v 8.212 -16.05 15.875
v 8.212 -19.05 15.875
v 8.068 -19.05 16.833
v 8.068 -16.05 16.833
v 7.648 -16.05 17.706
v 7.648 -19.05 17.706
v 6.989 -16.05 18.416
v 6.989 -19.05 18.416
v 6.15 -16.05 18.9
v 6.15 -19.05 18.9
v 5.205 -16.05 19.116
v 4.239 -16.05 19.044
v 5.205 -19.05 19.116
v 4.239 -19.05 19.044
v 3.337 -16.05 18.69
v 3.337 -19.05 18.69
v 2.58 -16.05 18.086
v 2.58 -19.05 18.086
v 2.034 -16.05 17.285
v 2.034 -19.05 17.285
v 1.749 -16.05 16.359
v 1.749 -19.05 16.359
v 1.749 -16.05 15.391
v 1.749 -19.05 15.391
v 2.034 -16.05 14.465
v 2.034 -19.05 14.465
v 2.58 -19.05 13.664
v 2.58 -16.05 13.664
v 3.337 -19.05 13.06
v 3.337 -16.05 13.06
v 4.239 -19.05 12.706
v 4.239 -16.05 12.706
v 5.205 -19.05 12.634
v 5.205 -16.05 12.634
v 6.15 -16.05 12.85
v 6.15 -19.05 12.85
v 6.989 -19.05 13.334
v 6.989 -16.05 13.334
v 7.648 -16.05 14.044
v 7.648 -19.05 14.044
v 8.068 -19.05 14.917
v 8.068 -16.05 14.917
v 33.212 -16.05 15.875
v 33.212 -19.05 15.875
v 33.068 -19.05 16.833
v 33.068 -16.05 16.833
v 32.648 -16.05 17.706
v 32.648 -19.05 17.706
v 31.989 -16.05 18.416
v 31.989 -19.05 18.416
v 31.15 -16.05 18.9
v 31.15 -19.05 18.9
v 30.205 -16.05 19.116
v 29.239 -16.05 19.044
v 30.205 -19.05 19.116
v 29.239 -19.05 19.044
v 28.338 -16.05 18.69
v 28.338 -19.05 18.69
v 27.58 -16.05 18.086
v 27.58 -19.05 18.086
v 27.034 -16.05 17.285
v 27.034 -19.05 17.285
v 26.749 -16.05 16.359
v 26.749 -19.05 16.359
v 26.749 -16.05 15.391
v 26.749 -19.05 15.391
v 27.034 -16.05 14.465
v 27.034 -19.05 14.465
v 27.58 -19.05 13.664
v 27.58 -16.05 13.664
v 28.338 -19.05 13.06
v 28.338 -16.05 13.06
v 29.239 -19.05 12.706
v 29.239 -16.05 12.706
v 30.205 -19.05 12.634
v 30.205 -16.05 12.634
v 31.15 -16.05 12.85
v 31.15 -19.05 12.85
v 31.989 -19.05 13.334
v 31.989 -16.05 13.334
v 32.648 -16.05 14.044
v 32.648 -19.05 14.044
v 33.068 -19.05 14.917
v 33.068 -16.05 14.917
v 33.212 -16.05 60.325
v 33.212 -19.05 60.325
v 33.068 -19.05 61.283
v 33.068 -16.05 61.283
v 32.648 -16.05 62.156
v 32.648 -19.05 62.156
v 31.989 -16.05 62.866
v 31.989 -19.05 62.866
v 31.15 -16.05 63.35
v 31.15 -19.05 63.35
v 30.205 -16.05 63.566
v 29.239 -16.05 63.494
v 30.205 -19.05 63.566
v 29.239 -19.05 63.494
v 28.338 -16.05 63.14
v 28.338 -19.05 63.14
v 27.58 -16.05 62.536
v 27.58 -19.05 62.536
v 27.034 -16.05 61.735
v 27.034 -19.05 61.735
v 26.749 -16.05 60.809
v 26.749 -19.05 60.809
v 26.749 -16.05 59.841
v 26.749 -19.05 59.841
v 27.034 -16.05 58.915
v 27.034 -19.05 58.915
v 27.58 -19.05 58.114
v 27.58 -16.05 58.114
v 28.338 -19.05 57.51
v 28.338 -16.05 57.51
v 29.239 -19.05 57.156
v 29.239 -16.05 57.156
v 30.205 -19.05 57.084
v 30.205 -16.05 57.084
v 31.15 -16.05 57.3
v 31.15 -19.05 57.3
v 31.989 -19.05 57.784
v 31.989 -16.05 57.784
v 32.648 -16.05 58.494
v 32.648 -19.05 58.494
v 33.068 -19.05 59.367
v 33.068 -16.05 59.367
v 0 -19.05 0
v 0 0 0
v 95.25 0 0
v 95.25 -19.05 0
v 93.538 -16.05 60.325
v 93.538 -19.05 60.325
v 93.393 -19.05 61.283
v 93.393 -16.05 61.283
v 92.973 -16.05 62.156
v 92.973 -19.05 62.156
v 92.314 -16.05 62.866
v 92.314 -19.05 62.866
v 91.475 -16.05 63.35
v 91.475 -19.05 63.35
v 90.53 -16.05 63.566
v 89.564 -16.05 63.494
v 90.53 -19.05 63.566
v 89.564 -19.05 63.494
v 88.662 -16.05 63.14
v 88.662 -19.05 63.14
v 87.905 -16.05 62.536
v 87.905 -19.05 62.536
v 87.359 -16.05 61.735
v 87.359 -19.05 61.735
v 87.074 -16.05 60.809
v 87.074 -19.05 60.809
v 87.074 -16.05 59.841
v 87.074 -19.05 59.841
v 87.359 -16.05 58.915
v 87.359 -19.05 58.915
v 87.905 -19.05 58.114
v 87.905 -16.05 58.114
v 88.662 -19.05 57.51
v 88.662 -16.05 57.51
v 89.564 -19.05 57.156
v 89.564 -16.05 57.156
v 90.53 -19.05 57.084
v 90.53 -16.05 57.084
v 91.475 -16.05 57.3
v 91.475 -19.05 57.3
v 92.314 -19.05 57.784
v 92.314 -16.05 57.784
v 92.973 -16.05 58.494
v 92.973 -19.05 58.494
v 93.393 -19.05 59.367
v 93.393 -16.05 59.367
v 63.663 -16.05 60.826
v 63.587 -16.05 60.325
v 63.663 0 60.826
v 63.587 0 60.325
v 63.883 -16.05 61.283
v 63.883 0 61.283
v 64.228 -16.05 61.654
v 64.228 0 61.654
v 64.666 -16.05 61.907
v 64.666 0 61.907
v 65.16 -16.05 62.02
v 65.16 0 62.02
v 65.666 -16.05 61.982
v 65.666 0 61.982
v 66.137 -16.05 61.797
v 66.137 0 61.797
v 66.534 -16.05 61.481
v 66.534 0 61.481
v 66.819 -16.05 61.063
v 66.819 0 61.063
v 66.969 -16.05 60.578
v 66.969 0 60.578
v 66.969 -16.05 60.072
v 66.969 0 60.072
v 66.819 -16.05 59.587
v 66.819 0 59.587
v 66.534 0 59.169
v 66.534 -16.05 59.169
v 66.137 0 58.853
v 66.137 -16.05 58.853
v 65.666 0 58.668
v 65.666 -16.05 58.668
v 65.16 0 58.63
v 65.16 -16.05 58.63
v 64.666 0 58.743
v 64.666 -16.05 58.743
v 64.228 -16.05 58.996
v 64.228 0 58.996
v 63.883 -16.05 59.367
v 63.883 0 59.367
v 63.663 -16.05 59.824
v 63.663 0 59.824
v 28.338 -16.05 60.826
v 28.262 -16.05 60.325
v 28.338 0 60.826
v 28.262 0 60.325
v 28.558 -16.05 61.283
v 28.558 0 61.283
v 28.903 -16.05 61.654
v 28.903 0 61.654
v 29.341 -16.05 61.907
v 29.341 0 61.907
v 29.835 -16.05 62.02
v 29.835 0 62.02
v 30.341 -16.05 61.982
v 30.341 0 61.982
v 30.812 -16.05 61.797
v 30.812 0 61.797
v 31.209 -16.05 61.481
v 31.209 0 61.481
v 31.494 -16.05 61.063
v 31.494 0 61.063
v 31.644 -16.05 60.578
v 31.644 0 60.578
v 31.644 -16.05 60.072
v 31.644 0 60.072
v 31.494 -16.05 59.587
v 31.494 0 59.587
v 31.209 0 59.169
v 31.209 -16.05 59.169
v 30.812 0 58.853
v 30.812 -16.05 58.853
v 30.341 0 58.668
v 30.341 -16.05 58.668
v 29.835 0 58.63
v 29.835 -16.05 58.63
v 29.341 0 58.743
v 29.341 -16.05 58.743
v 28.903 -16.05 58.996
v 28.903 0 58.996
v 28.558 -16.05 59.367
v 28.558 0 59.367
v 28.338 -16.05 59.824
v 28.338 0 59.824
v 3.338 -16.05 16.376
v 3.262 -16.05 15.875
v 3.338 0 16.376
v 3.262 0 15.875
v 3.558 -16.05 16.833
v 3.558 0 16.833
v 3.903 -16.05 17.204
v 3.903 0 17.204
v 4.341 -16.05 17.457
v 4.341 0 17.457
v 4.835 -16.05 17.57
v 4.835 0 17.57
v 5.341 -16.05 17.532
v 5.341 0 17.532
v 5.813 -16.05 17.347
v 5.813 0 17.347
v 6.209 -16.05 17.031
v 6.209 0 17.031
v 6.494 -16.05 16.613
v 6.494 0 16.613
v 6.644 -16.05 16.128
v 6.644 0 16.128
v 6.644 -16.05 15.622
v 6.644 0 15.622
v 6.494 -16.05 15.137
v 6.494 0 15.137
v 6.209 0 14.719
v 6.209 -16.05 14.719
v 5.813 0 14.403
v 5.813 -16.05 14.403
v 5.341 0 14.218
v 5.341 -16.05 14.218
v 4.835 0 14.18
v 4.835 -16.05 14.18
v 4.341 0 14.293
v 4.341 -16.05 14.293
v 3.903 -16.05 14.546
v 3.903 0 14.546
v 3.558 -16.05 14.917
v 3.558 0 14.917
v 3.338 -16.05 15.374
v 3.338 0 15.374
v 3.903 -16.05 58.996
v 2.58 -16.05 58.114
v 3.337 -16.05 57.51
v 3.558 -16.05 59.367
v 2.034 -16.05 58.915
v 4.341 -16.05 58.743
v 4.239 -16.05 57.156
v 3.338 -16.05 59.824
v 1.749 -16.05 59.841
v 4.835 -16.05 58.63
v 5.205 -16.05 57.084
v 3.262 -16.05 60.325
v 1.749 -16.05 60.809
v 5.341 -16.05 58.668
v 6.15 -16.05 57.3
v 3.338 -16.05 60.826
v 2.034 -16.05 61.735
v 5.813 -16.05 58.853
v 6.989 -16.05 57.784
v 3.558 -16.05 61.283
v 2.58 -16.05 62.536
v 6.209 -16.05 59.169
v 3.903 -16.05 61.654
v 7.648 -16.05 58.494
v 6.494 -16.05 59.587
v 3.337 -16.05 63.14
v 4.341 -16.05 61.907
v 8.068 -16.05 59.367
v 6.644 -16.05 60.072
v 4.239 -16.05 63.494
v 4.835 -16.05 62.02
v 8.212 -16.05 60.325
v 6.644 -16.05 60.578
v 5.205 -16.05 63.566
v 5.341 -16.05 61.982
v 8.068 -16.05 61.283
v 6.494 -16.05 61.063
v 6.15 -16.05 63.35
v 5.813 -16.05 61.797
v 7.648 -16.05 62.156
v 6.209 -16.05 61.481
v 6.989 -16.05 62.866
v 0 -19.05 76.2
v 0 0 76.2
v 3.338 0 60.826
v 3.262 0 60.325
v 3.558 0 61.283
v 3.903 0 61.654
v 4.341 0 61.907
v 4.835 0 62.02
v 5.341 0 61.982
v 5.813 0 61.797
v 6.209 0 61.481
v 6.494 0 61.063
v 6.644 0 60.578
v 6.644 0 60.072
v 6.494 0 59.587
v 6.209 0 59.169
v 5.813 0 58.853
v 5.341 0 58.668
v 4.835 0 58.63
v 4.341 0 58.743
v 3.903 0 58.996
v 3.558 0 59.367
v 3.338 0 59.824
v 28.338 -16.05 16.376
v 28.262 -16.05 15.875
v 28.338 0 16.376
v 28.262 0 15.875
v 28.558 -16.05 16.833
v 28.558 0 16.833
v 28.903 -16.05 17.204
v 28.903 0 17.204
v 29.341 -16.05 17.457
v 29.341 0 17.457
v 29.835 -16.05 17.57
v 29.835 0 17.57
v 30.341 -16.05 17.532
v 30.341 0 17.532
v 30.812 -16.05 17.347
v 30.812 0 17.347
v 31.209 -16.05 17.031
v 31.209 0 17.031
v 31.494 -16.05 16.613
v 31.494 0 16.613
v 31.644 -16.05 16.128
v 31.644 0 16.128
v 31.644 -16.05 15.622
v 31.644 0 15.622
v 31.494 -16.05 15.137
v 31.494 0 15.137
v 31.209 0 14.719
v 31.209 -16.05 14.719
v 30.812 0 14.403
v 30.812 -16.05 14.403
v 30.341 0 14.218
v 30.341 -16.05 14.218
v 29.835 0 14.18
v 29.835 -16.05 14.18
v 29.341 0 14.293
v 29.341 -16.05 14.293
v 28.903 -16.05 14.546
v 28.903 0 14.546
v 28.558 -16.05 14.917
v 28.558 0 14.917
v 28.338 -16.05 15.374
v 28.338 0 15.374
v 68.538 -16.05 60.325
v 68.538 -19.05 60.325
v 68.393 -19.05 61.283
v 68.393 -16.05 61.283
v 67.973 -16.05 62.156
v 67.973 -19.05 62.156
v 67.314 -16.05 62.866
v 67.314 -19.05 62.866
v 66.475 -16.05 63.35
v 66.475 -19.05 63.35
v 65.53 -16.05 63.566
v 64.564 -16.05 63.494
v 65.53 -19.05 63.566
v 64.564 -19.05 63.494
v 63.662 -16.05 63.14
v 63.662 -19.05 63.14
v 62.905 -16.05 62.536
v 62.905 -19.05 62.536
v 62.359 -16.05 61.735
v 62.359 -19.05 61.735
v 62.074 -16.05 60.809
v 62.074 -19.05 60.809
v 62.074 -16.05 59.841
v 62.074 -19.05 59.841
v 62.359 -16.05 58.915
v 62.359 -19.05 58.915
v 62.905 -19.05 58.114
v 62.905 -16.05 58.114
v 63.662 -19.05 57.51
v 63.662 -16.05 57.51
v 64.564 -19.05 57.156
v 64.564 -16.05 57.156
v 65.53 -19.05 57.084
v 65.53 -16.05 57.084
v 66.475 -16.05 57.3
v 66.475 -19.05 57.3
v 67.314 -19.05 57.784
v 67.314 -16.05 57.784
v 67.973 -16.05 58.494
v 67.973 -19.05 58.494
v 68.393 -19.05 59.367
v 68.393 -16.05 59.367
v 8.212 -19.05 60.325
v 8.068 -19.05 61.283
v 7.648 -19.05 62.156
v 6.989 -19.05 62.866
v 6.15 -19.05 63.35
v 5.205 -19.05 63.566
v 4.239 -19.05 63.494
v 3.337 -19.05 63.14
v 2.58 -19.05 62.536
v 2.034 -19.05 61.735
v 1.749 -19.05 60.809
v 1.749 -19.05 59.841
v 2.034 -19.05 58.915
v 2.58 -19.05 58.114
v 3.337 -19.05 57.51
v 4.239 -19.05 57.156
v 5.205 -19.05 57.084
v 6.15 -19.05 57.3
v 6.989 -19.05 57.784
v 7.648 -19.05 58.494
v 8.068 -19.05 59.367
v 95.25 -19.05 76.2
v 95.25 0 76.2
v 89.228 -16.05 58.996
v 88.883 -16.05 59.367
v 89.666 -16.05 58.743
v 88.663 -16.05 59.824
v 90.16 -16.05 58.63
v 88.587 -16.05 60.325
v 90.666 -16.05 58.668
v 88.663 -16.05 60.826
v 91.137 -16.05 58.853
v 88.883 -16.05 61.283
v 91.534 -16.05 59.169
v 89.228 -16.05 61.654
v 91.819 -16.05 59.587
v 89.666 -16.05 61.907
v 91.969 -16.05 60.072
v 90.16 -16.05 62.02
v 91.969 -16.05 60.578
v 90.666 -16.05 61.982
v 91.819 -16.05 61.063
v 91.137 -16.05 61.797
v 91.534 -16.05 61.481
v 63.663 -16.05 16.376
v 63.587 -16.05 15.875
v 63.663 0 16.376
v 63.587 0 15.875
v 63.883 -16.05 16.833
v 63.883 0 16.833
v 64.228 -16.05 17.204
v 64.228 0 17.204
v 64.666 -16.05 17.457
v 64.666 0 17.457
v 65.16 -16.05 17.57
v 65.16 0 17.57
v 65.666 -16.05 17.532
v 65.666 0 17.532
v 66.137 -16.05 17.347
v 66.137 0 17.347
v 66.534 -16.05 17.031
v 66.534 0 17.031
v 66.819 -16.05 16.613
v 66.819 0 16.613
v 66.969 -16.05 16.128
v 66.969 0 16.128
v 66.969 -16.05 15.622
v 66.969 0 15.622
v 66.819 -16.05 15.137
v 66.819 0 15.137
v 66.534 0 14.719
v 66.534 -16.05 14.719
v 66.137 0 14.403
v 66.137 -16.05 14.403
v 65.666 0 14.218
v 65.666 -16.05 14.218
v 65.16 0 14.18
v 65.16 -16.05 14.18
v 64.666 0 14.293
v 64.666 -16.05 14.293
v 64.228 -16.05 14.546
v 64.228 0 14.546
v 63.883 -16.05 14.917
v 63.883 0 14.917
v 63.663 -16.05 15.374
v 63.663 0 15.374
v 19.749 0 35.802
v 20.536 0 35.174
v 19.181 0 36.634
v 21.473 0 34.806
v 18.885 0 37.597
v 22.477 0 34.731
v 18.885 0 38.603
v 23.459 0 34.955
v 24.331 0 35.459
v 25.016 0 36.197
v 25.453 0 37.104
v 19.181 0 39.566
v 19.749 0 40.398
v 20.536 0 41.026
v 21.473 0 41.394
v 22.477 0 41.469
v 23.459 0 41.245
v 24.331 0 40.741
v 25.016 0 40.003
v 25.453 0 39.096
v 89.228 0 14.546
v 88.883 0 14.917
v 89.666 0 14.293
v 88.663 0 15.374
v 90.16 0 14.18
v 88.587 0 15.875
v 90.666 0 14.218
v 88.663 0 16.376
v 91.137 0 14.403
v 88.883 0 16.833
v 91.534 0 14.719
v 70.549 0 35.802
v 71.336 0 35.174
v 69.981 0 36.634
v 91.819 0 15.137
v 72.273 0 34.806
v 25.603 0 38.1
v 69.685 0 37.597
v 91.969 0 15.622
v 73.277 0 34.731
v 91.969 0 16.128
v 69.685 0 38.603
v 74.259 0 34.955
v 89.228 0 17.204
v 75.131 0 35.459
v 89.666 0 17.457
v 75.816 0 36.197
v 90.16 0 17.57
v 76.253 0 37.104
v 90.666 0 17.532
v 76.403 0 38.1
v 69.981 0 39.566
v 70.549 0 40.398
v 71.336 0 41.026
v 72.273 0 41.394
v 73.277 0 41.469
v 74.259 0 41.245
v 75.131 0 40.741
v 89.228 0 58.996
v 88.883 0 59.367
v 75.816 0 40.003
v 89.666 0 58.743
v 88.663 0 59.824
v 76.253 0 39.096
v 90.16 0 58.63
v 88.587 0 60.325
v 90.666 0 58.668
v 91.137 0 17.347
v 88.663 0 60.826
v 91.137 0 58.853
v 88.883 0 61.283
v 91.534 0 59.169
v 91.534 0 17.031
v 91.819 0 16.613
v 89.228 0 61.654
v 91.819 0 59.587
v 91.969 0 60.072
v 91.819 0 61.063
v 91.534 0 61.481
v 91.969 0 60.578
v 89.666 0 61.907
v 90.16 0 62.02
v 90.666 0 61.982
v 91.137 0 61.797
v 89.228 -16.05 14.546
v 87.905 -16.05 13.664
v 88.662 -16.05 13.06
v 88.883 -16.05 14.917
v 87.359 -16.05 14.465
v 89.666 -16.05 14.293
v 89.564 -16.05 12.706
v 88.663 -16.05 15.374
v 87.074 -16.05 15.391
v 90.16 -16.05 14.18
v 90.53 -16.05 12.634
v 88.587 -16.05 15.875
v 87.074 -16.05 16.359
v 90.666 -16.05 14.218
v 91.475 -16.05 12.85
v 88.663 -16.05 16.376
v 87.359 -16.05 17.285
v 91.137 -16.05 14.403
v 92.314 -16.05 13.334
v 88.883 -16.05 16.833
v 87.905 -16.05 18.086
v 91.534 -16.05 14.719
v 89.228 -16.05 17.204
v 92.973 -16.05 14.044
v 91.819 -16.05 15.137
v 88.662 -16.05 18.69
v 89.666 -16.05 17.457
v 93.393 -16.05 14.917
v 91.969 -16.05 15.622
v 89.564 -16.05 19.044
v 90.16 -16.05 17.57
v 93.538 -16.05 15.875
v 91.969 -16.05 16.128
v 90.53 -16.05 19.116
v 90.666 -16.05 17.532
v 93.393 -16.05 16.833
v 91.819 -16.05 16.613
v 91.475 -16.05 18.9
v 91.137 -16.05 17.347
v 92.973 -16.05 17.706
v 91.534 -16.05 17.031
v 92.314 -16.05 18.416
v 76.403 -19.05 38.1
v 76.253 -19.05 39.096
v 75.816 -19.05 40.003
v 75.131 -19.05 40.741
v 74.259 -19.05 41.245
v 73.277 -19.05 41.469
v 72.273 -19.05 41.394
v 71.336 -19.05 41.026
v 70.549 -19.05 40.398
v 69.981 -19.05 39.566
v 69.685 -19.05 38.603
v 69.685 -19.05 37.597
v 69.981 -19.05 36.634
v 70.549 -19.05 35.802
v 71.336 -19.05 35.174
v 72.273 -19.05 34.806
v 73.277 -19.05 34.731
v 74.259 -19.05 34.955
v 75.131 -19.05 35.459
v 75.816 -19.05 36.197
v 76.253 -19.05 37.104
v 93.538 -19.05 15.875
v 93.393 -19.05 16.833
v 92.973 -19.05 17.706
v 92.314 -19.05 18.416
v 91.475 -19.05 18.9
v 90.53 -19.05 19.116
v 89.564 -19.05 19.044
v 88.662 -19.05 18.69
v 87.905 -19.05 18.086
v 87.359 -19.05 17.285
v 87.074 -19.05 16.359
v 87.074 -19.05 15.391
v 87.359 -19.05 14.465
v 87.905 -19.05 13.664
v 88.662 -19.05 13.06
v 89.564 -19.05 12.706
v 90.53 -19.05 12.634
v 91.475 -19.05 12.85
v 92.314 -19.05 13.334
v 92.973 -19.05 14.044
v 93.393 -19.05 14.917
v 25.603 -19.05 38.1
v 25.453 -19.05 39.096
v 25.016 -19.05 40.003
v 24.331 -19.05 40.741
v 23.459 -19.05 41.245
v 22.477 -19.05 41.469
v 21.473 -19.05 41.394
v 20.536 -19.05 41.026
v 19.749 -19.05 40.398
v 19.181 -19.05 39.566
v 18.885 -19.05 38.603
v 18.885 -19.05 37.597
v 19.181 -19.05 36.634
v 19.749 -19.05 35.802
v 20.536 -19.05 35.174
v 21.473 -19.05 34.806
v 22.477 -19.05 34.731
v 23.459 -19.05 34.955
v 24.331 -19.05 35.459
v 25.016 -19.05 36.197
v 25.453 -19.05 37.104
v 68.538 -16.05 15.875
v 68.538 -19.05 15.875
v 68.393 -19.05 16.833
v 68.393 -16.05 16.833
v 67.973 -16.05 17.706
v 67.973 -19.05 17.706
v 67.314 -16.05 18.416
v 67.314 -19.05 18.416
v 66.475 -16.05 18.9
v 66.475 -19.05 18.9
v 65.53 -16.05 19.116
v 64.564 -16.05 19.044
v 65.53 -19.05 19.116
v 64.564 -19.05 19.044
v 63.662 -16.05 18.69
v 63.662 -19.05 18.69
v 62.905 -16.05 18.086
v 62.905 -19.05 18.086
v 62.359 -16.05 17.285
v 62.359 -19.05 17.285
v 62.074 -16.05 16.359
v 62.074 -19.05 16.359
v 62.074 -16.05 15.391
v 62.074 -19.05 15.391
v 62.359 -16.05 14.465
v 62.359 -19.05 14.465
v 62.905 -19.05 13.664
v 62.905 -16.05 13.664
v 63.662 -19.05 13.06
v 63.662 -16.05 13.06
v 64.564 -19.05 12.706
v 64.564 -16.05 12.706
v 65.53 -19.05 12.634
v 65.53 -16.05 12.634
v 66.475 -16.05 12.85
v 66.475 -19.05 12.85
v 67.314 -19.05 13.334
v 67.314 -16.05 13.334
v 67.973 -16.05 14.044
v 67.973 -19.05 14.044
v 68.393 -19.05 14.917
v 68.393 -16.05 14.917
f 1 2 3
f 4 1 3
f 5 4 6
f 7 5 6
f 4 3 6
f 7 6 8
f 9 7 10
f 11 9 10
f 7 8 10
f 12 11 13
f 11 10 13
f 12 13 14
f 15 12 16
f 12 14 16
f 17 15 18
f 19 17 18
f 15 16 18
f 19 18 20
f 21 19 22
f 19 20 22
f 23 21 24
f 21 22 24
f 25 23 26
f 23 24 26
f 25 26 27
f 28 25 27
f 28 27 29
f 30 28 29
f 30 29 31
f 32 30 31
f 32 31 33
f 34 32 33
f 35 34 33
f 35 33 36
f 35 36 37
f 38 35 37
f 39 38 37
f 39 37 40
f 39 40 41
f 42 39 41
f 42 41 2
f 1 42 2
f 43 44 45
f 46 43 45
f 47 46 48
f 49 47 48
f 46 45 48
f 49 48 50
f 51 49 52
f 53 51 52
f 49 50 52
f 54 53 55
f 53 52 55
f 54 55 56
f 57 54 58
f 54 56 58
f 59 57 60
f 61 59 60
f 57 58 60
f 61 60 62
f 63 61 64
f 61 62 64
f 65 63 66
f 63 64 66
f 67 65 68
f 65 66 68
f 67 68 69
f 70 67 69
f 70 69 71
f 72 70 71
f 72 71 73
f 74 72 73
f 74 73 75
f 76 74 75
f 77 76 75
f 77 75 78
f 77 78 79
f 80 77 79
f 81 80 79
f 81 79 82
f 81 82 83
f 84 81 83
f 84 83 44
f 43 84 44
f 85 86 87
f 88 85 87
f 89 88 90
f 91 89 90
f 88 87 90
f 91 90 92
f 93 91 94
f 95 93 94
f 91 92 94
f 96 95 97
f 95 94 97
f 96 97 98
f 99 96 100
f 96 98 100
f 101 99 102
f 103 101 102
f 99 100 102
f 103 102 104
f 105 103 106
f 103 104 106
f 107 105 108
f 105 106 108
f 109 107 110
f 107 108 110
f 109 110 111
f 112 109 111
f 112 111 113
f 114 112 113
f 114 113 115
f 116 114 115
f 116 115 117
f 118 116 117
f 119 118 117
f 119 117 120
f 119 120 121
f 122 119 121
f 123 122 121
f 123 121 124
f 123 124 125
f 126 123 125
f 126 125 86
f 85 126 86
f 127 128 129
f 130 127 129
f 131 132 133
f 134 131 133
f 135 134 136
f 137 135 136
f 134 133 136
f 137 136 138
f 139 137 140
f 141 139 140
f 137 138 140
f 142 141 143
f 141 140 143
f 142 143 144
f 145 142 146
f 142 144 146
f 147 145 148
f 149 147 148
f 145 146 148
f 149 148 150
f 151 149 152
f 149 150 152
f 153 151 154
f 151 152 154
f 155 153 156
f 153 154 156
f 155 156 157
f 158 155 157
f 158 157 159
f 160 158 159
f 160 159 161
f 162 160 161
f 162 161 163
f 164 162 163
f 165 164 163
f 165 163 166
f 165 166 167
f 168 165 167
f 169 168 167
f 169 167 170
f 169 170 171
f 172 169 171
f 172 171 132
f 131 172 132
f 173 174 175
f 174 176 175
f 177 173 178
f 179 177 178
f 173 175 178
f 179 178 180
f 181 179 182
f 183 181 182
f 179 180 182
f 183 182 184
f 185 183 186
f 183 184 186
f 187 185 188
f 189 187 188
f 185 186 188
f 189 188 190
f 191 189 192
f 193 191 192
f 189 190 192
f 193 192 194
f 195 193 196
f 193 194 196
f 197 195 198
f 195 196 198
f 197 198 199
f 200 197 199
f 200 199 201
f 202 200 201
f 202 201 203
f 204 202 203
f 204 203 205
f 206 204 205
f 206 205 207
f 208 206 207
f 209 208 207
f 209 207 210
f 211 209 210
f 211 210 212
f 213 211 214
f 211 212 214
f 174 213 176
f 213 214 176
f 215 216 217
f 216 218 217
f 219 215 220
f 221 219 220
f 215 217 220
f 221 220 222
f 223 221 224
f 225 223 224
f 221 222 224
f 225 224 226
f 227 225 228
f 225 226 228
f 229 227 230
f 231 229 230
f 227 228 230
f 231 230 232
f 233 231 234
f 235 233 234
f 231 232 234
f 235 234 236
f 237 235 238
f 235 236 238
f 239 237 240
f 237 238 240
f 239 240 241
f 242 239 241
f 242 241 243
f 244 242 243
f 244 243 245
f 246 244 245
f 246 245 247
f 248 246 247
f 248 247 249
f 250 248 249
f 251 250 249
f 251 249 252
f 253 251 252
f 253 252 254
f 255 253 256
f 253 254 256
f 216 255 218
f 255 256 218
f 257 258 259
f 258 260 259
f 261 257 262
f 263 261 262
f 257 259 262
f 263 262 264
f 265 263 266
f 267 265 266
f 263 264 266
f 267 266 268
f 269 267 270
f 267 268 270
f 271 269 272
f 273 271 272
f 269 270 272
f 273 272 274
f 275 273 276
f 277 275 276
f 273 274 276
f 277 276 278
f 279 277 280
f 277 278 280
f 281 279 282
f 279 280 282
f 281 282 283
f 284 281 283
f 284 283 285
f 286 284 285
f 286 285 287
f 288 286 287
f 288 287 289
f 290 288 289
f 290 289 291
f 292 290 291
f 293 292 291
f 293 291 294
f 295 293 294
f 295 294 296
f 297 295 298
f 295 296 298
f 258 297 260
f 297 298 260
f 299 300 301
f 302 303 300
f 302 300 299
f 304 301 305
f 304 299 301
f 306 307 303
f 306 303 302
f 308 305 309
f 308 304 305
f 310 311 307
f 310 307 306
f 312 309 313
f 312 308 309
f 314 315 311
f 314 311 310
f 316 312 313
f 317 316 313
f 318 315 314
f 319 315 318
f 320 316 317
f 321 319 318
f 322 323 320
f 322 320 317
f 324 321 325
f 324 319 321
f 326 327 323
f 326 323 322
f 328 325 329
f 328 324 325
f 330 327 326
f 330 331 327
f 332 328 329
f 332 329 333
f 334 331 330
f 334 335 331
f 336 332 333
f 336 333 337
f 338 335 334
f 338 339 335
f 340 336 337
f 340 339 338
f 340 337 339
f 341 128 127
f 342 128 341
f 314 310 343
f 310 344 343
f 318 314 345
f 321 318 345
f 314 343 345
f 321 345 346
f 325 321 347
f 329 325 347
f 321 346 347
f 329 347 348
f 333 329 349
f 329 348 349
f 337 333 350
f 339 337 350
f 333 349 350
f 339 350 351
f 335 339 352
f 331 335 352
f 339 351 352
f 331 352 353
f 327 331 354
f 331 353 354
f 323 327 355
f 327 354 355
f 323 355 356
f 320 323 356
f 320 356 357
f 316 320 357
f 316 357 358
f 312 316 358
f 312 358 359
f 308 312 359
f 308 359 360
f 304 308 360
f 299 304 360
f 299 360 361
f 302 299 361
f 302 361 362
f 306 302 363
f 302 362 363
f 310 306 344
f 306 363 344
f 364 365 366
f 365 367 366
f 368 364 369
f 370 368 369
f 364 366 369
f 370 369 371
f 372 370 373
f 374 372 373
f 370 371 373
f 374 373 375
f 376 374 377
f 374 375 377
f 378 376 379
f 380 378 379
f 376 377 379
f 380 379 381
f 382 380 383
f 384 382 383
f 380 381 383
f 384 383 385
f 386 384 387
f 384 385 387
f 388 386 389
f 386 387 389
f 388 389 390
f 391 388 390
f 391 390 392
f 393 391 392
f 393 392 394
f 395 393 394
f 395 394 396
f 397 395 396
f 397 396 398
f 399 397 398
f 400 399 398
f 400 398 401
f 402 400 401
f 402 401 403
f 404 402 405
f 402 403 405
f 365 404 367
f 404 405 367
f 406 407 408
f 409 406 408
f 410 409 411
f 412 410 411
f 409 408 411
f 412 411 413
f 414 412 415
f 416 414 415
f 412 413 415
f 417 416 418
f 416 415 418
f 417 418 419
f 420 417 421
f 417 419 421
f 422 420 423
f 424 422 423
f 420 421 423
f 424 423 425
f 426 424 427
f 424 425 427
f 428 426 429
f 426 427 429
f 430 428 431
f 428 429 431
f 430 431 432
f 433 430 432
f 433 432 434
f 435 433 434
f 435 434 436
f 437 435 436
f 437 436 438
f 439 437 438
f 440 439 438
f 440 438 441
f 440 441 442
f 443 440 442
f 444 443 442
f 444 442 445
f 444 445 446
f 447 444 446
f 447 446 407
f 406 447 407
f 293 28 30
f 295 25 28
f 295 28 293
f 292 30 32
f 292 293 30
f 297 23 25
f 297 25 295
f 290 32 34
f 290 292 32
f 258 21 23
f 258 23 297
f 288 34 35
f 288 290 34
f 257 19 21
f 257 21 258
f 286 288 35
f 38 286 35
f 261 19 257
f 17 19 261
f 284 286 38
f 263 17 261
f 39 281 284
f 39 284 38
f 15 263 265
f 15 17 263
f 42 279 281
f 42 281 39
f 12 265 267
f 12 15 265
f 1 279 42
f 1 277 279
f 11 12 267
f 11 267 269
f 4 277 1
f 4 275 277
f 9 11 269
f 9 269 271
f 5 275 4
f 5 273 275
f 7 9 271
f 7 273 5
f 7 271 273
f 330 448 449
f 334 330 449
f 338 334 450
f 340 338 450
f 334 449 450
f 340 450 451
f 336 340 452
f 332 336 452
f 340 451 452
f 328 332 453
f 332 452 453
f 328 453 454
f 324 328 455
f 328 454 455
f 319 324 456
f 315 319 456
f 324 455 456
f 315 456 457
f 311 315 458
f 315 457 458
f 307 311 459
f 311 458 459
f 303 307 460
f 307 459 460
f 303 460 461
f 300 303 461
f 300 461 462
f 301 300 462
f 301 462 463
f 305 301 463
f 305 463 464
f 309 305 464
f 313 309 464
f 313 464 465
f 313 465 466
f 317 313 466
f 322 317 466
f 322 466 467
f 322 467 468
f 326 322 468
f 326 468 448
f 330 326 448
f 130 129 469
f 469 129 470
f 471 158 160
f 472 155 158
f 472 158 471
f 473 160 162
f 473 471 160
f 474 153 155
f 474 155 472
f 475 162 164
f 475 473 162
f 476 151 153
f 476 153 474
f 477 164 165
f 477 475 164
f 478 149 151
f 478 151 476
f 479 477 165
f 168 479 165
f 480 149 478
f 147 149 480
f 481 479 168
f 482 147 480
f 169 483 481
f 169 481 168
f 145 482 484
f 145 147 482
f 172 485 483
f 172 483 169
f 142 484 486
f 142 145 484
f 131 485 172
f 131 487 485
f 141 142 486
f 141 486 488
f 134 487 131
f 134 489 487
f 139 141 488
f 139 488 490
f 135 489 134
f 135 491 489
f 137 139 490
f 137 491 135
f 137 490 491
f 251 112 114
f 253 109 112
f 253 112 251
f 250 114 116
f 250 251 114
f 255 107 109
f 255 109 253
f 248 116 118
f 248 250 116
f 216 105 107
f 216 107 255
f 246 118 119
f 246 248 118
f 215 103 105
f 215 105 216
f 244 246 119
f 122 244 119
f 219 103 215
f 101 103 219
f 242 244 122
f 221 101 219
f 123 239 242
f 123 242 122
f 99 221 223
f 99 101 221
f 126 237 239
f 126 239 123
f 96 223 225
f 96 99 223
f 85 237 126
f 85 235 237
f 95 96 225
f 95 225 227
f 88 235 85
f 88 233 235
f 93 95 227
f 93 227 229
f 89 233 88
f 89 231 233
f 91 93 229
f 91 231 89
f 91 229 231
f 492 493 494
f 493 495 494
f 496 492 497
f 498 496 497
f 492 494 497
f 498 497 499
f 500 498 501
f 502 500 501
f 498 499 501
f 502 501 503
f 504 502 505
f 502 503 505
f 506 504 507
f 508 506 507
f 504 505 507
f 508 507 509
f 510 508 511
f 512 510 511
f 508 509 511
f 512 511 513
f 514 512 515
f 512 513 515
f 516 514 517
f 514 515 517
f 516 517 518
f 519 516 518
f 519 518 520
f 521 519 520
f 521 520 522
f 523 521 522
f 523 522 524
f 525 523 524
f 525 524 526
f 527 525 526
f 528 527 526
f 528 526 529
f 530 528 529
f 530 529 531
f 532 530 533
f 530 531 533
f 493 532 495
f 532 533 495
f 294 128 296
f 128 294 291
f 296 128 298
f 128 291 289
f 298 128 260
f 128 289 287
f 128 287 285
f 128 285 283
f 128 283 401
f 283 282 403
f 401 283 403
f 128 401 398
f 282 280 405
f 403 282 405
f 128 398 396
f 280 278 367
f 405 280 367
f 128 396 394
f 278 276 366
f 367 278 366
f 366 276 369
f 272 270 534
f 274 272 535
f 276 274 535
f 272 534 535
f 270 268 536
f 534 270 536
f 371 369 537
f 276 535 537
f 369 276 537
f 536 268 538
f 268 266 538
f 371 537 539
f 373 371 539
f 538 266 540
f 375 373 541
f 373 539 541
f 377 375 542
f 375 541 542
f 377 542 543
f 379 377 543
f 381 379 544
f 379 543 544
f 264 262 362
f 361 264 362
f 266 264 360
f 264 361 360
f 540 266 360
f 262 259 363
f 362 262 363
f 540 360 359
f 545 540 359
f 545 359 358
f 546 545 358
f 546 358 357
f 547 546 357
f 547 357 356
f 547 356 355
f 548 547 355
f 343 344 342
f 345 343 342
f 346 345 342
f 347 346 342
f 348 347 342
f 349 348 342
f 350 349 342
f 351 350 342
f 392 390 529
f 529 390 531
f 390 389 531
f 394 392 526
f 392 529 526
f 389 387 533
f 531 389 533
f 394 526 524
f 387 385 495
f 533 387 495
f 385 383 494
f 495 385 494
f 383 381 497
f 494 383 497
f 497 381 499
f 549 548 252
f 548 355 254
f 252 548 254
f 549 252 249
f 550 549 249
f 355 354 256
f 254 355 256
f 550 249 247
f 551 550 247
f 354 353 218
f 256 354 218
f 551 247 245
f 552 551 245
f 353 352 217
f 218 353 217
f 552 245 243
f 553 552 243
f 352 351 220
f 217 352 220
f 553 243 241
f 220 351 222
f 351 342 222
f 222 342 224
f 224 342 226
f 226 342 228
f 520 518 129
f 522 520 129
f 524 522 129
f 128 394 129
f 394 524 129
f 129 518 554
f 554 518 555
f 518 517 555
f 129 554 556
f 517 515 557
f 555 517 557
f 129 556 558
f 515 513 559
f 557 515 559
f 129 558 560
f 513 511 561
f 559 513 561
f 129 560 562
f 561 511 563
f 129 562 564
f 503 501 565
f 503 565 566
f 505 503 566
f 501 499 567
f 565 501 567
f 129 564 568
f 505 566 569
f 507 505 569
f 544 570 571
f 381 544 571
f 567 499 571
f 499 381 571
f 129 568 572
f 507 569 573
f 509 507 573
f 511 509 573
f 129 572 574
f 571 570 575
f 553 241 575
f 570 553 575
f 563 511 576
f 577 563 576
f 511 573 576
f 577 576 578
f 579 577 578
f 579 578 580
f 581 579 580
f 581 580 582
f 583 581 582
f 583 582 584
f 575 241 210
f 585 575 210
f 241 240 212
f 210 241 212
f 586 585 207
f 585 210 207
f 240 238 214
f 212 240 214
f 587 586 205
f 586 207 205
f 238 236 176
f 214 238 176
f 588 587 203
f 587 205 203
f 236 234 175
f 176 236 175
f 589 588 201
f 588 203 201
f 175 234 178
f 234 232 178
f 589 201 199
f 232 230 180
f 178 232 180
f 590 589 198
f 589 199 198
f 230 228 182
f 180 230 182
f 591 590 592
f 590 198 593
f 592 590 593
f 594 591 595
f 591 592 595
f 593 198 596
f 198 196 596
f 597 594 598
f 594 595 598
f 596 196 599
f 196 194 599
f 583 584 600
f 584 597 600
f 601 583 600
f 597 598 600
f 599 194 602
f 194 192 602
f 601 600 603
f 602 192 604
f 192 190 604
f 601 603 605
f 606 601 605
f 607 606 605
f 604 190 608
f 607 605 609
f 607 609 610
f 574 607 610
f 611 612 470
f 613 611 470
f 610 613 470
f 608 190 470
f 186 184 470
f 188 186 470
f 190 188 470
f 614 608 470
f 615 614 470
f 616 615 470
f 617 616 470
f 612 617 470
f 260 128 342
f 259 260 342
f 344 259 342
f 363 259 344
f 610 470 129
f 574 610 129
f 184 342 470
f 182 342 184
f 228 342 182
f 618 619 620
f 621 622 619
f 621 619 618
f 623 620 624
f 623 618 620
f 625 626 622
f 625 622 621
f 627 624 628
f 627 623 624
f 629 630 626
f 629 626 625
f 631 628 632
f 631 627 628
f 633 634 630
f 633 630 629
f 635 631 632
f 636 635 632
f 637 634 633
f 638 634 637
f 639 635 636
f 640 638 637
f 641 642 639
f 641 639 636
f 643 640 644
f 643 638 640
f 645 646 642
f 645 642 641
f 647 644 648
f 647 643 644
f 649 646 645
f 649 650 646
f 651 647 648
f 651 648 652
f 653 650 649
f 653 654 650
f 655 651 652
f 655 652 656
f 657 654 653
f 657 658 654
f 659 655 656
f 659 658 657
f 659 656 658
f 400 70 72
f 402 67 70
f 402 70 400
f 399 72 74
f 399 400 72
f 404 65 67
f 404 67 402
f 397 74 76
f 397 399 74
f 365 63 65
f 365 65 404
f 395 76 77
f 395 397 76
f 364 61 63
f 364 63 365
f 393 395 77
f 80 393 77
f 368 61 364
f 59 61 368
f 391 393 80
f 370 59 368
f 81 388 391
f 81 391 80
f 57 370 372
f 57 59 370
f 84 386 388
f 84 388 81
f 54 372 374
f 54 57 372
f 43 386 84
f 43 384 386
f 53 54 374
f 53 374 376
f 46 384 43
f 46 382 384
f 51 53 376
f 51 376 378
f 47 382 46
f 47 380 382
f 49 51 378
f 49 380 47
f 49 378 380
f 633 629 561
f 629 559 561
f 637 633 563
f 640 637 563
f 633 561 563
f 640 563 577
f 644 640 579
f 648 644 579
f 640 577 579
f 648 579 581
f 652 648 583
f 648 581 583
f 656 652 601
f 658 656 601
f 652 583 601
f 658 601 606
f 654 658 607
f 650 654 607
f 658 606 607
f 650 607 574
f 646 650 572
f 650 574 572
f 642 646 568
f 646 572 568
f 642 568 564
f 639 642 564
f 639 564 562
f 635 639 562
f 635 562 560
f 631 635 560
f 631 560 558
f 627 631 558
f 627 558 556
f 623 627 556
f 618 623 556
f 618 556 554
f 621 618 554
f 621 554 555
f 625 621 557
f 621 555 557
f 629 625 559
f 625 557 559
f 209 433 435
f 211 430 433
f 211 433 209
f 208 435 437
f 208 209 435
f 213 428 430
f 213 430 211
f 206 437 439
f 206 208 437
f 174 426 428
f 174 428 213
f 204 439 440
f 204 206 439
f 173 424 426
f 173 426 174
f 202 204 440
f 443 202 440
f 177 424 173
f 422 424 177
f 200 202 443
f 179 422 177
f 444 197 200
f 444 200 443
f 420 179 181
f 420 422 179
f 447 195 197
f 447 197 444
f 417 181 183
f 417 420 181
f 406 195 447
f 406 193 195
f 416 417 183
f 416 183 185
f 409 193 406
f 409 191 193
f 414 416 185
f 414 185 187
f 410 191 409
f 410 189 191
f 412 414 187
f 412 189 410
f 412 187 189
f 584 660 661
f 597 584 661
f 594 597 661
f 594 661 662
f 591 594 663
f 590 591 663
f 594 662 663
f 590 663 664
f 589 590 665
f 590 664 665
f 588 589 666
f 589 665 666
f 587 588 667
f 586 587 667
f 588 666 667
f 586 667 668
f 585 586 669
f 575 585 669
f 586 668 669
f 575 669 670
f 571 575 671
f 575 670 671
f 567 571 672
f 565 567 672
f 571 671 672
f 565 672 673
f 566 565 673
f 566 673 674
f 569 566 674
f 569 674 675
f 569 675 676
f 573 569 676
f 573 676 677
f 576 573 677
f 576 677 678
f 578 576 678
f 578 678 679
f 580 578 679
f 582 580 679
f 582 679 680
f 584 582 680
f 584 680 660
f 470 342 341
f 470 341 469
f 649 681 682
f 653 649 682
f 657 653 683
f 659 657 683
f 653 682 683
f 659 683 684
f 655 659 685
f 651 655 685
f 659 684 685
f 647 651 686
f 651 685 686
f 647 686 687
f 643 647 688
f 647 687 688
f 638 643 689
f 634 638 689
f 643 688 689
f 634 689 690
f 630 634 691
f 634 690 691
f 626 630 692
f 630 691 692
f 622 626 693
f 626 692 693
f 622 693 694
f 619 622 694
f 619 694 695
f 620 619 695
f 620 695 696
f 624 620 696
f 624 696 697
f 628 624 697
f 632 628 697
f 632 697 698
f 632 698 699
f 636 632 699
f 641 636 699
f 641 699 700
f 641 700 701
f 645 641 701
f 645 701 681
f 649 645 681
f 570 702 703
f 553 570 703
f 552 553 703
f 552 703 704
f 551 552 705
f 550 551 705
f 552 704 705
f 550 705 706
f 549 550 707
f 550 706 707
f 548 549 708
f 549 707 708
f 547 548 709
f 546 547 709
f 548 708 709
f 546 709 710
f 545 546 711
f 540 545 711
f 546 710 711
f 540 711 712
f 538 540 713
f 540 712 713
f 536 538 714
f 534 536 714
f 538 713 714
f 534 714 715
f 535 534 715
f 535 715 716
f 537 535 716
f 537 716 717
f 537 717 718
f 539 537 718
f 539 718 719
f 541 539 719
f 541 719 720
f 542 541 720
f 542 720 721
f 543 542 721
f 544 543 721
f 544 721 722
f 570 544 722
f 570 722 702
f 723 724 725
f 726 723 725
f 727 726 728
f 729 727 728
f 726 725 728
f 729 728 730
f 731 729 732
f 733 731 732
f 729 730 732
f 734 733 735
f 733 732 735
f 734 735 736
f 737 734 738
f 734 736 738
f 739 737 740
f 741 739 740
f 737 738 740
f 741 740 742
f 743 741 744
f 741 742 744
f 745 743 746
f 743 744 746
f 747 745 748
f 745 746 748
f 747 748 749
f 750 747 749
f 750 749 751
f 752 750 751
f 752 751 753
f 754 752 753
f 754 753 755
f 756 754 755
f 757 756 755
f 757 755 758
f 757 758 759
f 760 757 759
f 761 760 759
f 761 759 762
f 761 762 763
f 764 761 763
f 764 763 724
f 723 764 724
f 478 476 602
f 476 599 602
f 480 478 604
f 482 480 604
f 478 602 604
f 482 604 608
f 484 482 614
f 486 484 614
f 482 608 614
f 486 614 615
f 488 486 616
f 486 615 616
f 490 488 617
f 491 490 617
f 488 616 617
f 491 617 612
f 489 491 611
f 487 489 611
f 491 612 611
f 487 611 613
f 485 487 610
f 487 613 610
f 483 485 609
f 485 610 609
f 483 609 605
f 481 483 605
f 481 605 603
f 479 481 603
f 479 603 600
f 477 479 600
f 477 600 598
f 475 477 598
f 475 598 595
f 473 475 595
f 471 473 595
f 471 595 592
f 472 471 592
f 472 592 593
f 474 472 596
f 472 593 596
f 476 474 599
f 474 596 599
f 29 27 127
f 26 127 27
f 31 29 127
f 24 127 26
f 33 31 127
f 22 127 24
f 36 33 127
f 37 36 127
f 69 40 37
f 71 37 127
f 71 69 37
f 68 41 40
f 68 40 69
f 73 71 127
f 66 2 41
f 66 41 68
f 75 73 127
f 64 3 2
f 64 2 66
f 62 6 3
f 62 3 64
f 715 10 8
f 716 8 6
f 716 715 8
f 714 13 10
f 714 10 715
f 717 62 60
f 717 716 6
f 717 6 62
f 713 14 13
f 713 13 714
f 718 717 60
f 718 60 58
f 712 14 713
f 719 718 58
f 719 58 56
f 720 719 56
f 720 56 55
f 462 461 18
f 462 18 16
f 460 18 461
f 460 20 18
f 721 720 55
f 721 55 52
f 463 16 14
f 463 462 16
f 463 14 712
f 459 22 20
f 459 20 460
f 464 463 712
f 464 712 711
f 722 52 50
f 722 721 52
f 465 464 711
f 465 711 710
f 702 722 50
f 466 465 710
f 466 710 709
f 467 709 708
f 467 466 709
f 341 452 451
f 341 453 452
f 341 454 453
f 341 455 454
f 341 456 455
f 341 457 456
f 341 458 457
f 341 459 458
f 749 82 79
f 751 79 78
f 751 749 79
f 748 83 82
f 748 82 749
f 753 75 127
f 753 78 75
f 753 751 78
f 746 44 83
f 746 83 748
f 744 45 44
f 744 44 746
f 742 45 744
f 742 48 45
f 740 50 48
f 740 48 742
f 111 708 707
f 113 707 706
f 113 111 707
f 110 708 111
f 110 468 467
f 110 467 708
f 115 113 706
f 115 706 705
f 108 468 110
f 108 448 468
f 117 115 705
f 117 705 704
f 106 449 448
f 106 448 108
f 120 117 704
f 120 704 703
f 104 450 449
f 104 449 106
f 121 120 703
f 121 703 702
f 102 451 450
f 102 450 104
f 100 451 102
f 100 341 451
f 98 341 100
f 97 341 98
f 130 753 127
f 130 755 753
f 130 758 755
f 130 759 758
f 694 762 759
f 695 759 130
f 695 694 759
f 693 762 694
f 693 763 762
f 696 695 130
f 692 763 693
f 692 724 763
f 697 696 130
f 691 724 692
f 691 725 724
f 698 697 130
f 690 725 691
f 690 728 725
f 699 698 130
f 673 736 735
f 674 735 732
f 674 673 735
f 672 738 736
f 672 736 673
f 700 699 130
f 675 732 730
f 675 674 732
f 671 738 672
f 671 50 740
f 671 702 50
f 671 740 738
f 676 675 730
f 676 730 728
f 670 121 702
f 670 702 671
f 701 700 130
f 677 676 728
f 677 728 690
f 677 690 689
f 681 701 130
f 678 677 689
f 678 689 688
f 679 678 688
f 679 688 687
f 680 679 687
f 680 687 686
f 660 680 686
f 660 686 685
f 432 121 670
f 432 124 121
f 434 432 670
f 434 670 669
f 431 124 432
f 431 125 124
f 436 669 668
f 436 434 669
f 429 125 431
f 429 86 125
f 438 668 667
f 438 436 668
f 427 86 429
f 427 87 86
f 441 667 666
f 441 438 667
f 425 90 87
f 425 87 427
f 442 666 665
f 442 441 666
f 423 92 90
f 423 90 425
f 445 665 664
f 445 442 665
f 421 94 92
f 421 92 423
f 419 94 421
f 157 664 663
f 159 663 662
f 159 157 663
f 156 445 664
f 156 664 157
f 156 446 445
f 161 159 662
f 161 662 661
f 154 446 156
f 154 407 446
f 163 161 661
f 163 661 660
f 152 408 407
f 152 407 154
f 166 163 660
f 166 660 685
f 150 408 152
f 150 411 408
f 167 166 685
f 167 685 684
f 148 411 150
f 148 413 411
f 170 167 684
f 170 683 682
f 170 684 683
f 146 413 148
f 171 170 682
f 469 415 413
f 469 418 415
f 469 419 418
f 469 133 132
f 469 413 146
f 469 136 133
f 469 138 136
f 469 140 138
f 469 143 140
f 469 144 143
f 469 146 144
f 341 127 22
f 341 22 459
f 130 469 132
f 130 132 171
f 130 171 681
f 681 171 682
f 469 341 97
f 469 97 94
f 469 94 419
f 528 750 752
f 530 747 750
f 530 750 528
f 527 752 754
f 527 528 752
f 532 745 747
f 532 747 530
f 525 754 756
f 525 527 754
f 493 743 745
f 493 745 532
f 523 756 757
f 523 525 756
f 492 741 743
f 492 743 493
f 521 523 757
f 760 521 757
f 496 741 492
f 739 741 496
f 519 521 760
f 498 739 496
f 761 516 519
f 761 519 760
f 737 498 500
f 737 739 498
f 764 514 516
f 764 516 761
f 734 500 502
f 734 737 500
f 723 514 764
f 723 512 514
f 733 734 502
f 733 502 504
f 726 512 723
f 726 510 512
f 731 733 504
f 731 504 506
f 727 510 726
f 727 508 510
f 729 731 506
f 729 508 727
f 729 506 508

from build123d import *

# Parameters (mm, degrees)
F0_W           = 95.25
F0_H           = 76.2
F1_DEPTH       = 19.05
F3_D           = 3.4
F3_CBORE_D     = 6.5
F3_CBORE_DEPTH = 3
F5_D           = 6.7564


with BuildPart() as f1:
    # F0 (on Front) → F1 (new body)
    with BuildSketch(Plane.XZ):
        with Locations((47.625, 38.1)):
            Rectangle(F0_W, F0_H)
    extrude(amount=F1_DEPTH)

    # F3 (through all)
    with Locations(Plane.XZ.offset(19.05)):
        with Locations((4.9625, 60.325), (29.9625, 60.325), (65.2875, 60.325), (90.2875, 60.325), (4.9625, 15.875), (29.9625, 15.875), (65.2875, 15.875), (90.2875, 15.875)):
            CounterBoreHole(F3_D / 2, F3_CBORE_D / 2, F3_CBORE_DEPTH)

    # F5 (through all)
    with Locations(Plane(origin=(0, 0, 0), x_dir=(-1, 0, 0), z_dir=(0, 1, 0))):
        with Locations((-73.025, 38.1), (-22.225, 38.1)):
            Hole(F5_D / 2)


solid = f1.part
